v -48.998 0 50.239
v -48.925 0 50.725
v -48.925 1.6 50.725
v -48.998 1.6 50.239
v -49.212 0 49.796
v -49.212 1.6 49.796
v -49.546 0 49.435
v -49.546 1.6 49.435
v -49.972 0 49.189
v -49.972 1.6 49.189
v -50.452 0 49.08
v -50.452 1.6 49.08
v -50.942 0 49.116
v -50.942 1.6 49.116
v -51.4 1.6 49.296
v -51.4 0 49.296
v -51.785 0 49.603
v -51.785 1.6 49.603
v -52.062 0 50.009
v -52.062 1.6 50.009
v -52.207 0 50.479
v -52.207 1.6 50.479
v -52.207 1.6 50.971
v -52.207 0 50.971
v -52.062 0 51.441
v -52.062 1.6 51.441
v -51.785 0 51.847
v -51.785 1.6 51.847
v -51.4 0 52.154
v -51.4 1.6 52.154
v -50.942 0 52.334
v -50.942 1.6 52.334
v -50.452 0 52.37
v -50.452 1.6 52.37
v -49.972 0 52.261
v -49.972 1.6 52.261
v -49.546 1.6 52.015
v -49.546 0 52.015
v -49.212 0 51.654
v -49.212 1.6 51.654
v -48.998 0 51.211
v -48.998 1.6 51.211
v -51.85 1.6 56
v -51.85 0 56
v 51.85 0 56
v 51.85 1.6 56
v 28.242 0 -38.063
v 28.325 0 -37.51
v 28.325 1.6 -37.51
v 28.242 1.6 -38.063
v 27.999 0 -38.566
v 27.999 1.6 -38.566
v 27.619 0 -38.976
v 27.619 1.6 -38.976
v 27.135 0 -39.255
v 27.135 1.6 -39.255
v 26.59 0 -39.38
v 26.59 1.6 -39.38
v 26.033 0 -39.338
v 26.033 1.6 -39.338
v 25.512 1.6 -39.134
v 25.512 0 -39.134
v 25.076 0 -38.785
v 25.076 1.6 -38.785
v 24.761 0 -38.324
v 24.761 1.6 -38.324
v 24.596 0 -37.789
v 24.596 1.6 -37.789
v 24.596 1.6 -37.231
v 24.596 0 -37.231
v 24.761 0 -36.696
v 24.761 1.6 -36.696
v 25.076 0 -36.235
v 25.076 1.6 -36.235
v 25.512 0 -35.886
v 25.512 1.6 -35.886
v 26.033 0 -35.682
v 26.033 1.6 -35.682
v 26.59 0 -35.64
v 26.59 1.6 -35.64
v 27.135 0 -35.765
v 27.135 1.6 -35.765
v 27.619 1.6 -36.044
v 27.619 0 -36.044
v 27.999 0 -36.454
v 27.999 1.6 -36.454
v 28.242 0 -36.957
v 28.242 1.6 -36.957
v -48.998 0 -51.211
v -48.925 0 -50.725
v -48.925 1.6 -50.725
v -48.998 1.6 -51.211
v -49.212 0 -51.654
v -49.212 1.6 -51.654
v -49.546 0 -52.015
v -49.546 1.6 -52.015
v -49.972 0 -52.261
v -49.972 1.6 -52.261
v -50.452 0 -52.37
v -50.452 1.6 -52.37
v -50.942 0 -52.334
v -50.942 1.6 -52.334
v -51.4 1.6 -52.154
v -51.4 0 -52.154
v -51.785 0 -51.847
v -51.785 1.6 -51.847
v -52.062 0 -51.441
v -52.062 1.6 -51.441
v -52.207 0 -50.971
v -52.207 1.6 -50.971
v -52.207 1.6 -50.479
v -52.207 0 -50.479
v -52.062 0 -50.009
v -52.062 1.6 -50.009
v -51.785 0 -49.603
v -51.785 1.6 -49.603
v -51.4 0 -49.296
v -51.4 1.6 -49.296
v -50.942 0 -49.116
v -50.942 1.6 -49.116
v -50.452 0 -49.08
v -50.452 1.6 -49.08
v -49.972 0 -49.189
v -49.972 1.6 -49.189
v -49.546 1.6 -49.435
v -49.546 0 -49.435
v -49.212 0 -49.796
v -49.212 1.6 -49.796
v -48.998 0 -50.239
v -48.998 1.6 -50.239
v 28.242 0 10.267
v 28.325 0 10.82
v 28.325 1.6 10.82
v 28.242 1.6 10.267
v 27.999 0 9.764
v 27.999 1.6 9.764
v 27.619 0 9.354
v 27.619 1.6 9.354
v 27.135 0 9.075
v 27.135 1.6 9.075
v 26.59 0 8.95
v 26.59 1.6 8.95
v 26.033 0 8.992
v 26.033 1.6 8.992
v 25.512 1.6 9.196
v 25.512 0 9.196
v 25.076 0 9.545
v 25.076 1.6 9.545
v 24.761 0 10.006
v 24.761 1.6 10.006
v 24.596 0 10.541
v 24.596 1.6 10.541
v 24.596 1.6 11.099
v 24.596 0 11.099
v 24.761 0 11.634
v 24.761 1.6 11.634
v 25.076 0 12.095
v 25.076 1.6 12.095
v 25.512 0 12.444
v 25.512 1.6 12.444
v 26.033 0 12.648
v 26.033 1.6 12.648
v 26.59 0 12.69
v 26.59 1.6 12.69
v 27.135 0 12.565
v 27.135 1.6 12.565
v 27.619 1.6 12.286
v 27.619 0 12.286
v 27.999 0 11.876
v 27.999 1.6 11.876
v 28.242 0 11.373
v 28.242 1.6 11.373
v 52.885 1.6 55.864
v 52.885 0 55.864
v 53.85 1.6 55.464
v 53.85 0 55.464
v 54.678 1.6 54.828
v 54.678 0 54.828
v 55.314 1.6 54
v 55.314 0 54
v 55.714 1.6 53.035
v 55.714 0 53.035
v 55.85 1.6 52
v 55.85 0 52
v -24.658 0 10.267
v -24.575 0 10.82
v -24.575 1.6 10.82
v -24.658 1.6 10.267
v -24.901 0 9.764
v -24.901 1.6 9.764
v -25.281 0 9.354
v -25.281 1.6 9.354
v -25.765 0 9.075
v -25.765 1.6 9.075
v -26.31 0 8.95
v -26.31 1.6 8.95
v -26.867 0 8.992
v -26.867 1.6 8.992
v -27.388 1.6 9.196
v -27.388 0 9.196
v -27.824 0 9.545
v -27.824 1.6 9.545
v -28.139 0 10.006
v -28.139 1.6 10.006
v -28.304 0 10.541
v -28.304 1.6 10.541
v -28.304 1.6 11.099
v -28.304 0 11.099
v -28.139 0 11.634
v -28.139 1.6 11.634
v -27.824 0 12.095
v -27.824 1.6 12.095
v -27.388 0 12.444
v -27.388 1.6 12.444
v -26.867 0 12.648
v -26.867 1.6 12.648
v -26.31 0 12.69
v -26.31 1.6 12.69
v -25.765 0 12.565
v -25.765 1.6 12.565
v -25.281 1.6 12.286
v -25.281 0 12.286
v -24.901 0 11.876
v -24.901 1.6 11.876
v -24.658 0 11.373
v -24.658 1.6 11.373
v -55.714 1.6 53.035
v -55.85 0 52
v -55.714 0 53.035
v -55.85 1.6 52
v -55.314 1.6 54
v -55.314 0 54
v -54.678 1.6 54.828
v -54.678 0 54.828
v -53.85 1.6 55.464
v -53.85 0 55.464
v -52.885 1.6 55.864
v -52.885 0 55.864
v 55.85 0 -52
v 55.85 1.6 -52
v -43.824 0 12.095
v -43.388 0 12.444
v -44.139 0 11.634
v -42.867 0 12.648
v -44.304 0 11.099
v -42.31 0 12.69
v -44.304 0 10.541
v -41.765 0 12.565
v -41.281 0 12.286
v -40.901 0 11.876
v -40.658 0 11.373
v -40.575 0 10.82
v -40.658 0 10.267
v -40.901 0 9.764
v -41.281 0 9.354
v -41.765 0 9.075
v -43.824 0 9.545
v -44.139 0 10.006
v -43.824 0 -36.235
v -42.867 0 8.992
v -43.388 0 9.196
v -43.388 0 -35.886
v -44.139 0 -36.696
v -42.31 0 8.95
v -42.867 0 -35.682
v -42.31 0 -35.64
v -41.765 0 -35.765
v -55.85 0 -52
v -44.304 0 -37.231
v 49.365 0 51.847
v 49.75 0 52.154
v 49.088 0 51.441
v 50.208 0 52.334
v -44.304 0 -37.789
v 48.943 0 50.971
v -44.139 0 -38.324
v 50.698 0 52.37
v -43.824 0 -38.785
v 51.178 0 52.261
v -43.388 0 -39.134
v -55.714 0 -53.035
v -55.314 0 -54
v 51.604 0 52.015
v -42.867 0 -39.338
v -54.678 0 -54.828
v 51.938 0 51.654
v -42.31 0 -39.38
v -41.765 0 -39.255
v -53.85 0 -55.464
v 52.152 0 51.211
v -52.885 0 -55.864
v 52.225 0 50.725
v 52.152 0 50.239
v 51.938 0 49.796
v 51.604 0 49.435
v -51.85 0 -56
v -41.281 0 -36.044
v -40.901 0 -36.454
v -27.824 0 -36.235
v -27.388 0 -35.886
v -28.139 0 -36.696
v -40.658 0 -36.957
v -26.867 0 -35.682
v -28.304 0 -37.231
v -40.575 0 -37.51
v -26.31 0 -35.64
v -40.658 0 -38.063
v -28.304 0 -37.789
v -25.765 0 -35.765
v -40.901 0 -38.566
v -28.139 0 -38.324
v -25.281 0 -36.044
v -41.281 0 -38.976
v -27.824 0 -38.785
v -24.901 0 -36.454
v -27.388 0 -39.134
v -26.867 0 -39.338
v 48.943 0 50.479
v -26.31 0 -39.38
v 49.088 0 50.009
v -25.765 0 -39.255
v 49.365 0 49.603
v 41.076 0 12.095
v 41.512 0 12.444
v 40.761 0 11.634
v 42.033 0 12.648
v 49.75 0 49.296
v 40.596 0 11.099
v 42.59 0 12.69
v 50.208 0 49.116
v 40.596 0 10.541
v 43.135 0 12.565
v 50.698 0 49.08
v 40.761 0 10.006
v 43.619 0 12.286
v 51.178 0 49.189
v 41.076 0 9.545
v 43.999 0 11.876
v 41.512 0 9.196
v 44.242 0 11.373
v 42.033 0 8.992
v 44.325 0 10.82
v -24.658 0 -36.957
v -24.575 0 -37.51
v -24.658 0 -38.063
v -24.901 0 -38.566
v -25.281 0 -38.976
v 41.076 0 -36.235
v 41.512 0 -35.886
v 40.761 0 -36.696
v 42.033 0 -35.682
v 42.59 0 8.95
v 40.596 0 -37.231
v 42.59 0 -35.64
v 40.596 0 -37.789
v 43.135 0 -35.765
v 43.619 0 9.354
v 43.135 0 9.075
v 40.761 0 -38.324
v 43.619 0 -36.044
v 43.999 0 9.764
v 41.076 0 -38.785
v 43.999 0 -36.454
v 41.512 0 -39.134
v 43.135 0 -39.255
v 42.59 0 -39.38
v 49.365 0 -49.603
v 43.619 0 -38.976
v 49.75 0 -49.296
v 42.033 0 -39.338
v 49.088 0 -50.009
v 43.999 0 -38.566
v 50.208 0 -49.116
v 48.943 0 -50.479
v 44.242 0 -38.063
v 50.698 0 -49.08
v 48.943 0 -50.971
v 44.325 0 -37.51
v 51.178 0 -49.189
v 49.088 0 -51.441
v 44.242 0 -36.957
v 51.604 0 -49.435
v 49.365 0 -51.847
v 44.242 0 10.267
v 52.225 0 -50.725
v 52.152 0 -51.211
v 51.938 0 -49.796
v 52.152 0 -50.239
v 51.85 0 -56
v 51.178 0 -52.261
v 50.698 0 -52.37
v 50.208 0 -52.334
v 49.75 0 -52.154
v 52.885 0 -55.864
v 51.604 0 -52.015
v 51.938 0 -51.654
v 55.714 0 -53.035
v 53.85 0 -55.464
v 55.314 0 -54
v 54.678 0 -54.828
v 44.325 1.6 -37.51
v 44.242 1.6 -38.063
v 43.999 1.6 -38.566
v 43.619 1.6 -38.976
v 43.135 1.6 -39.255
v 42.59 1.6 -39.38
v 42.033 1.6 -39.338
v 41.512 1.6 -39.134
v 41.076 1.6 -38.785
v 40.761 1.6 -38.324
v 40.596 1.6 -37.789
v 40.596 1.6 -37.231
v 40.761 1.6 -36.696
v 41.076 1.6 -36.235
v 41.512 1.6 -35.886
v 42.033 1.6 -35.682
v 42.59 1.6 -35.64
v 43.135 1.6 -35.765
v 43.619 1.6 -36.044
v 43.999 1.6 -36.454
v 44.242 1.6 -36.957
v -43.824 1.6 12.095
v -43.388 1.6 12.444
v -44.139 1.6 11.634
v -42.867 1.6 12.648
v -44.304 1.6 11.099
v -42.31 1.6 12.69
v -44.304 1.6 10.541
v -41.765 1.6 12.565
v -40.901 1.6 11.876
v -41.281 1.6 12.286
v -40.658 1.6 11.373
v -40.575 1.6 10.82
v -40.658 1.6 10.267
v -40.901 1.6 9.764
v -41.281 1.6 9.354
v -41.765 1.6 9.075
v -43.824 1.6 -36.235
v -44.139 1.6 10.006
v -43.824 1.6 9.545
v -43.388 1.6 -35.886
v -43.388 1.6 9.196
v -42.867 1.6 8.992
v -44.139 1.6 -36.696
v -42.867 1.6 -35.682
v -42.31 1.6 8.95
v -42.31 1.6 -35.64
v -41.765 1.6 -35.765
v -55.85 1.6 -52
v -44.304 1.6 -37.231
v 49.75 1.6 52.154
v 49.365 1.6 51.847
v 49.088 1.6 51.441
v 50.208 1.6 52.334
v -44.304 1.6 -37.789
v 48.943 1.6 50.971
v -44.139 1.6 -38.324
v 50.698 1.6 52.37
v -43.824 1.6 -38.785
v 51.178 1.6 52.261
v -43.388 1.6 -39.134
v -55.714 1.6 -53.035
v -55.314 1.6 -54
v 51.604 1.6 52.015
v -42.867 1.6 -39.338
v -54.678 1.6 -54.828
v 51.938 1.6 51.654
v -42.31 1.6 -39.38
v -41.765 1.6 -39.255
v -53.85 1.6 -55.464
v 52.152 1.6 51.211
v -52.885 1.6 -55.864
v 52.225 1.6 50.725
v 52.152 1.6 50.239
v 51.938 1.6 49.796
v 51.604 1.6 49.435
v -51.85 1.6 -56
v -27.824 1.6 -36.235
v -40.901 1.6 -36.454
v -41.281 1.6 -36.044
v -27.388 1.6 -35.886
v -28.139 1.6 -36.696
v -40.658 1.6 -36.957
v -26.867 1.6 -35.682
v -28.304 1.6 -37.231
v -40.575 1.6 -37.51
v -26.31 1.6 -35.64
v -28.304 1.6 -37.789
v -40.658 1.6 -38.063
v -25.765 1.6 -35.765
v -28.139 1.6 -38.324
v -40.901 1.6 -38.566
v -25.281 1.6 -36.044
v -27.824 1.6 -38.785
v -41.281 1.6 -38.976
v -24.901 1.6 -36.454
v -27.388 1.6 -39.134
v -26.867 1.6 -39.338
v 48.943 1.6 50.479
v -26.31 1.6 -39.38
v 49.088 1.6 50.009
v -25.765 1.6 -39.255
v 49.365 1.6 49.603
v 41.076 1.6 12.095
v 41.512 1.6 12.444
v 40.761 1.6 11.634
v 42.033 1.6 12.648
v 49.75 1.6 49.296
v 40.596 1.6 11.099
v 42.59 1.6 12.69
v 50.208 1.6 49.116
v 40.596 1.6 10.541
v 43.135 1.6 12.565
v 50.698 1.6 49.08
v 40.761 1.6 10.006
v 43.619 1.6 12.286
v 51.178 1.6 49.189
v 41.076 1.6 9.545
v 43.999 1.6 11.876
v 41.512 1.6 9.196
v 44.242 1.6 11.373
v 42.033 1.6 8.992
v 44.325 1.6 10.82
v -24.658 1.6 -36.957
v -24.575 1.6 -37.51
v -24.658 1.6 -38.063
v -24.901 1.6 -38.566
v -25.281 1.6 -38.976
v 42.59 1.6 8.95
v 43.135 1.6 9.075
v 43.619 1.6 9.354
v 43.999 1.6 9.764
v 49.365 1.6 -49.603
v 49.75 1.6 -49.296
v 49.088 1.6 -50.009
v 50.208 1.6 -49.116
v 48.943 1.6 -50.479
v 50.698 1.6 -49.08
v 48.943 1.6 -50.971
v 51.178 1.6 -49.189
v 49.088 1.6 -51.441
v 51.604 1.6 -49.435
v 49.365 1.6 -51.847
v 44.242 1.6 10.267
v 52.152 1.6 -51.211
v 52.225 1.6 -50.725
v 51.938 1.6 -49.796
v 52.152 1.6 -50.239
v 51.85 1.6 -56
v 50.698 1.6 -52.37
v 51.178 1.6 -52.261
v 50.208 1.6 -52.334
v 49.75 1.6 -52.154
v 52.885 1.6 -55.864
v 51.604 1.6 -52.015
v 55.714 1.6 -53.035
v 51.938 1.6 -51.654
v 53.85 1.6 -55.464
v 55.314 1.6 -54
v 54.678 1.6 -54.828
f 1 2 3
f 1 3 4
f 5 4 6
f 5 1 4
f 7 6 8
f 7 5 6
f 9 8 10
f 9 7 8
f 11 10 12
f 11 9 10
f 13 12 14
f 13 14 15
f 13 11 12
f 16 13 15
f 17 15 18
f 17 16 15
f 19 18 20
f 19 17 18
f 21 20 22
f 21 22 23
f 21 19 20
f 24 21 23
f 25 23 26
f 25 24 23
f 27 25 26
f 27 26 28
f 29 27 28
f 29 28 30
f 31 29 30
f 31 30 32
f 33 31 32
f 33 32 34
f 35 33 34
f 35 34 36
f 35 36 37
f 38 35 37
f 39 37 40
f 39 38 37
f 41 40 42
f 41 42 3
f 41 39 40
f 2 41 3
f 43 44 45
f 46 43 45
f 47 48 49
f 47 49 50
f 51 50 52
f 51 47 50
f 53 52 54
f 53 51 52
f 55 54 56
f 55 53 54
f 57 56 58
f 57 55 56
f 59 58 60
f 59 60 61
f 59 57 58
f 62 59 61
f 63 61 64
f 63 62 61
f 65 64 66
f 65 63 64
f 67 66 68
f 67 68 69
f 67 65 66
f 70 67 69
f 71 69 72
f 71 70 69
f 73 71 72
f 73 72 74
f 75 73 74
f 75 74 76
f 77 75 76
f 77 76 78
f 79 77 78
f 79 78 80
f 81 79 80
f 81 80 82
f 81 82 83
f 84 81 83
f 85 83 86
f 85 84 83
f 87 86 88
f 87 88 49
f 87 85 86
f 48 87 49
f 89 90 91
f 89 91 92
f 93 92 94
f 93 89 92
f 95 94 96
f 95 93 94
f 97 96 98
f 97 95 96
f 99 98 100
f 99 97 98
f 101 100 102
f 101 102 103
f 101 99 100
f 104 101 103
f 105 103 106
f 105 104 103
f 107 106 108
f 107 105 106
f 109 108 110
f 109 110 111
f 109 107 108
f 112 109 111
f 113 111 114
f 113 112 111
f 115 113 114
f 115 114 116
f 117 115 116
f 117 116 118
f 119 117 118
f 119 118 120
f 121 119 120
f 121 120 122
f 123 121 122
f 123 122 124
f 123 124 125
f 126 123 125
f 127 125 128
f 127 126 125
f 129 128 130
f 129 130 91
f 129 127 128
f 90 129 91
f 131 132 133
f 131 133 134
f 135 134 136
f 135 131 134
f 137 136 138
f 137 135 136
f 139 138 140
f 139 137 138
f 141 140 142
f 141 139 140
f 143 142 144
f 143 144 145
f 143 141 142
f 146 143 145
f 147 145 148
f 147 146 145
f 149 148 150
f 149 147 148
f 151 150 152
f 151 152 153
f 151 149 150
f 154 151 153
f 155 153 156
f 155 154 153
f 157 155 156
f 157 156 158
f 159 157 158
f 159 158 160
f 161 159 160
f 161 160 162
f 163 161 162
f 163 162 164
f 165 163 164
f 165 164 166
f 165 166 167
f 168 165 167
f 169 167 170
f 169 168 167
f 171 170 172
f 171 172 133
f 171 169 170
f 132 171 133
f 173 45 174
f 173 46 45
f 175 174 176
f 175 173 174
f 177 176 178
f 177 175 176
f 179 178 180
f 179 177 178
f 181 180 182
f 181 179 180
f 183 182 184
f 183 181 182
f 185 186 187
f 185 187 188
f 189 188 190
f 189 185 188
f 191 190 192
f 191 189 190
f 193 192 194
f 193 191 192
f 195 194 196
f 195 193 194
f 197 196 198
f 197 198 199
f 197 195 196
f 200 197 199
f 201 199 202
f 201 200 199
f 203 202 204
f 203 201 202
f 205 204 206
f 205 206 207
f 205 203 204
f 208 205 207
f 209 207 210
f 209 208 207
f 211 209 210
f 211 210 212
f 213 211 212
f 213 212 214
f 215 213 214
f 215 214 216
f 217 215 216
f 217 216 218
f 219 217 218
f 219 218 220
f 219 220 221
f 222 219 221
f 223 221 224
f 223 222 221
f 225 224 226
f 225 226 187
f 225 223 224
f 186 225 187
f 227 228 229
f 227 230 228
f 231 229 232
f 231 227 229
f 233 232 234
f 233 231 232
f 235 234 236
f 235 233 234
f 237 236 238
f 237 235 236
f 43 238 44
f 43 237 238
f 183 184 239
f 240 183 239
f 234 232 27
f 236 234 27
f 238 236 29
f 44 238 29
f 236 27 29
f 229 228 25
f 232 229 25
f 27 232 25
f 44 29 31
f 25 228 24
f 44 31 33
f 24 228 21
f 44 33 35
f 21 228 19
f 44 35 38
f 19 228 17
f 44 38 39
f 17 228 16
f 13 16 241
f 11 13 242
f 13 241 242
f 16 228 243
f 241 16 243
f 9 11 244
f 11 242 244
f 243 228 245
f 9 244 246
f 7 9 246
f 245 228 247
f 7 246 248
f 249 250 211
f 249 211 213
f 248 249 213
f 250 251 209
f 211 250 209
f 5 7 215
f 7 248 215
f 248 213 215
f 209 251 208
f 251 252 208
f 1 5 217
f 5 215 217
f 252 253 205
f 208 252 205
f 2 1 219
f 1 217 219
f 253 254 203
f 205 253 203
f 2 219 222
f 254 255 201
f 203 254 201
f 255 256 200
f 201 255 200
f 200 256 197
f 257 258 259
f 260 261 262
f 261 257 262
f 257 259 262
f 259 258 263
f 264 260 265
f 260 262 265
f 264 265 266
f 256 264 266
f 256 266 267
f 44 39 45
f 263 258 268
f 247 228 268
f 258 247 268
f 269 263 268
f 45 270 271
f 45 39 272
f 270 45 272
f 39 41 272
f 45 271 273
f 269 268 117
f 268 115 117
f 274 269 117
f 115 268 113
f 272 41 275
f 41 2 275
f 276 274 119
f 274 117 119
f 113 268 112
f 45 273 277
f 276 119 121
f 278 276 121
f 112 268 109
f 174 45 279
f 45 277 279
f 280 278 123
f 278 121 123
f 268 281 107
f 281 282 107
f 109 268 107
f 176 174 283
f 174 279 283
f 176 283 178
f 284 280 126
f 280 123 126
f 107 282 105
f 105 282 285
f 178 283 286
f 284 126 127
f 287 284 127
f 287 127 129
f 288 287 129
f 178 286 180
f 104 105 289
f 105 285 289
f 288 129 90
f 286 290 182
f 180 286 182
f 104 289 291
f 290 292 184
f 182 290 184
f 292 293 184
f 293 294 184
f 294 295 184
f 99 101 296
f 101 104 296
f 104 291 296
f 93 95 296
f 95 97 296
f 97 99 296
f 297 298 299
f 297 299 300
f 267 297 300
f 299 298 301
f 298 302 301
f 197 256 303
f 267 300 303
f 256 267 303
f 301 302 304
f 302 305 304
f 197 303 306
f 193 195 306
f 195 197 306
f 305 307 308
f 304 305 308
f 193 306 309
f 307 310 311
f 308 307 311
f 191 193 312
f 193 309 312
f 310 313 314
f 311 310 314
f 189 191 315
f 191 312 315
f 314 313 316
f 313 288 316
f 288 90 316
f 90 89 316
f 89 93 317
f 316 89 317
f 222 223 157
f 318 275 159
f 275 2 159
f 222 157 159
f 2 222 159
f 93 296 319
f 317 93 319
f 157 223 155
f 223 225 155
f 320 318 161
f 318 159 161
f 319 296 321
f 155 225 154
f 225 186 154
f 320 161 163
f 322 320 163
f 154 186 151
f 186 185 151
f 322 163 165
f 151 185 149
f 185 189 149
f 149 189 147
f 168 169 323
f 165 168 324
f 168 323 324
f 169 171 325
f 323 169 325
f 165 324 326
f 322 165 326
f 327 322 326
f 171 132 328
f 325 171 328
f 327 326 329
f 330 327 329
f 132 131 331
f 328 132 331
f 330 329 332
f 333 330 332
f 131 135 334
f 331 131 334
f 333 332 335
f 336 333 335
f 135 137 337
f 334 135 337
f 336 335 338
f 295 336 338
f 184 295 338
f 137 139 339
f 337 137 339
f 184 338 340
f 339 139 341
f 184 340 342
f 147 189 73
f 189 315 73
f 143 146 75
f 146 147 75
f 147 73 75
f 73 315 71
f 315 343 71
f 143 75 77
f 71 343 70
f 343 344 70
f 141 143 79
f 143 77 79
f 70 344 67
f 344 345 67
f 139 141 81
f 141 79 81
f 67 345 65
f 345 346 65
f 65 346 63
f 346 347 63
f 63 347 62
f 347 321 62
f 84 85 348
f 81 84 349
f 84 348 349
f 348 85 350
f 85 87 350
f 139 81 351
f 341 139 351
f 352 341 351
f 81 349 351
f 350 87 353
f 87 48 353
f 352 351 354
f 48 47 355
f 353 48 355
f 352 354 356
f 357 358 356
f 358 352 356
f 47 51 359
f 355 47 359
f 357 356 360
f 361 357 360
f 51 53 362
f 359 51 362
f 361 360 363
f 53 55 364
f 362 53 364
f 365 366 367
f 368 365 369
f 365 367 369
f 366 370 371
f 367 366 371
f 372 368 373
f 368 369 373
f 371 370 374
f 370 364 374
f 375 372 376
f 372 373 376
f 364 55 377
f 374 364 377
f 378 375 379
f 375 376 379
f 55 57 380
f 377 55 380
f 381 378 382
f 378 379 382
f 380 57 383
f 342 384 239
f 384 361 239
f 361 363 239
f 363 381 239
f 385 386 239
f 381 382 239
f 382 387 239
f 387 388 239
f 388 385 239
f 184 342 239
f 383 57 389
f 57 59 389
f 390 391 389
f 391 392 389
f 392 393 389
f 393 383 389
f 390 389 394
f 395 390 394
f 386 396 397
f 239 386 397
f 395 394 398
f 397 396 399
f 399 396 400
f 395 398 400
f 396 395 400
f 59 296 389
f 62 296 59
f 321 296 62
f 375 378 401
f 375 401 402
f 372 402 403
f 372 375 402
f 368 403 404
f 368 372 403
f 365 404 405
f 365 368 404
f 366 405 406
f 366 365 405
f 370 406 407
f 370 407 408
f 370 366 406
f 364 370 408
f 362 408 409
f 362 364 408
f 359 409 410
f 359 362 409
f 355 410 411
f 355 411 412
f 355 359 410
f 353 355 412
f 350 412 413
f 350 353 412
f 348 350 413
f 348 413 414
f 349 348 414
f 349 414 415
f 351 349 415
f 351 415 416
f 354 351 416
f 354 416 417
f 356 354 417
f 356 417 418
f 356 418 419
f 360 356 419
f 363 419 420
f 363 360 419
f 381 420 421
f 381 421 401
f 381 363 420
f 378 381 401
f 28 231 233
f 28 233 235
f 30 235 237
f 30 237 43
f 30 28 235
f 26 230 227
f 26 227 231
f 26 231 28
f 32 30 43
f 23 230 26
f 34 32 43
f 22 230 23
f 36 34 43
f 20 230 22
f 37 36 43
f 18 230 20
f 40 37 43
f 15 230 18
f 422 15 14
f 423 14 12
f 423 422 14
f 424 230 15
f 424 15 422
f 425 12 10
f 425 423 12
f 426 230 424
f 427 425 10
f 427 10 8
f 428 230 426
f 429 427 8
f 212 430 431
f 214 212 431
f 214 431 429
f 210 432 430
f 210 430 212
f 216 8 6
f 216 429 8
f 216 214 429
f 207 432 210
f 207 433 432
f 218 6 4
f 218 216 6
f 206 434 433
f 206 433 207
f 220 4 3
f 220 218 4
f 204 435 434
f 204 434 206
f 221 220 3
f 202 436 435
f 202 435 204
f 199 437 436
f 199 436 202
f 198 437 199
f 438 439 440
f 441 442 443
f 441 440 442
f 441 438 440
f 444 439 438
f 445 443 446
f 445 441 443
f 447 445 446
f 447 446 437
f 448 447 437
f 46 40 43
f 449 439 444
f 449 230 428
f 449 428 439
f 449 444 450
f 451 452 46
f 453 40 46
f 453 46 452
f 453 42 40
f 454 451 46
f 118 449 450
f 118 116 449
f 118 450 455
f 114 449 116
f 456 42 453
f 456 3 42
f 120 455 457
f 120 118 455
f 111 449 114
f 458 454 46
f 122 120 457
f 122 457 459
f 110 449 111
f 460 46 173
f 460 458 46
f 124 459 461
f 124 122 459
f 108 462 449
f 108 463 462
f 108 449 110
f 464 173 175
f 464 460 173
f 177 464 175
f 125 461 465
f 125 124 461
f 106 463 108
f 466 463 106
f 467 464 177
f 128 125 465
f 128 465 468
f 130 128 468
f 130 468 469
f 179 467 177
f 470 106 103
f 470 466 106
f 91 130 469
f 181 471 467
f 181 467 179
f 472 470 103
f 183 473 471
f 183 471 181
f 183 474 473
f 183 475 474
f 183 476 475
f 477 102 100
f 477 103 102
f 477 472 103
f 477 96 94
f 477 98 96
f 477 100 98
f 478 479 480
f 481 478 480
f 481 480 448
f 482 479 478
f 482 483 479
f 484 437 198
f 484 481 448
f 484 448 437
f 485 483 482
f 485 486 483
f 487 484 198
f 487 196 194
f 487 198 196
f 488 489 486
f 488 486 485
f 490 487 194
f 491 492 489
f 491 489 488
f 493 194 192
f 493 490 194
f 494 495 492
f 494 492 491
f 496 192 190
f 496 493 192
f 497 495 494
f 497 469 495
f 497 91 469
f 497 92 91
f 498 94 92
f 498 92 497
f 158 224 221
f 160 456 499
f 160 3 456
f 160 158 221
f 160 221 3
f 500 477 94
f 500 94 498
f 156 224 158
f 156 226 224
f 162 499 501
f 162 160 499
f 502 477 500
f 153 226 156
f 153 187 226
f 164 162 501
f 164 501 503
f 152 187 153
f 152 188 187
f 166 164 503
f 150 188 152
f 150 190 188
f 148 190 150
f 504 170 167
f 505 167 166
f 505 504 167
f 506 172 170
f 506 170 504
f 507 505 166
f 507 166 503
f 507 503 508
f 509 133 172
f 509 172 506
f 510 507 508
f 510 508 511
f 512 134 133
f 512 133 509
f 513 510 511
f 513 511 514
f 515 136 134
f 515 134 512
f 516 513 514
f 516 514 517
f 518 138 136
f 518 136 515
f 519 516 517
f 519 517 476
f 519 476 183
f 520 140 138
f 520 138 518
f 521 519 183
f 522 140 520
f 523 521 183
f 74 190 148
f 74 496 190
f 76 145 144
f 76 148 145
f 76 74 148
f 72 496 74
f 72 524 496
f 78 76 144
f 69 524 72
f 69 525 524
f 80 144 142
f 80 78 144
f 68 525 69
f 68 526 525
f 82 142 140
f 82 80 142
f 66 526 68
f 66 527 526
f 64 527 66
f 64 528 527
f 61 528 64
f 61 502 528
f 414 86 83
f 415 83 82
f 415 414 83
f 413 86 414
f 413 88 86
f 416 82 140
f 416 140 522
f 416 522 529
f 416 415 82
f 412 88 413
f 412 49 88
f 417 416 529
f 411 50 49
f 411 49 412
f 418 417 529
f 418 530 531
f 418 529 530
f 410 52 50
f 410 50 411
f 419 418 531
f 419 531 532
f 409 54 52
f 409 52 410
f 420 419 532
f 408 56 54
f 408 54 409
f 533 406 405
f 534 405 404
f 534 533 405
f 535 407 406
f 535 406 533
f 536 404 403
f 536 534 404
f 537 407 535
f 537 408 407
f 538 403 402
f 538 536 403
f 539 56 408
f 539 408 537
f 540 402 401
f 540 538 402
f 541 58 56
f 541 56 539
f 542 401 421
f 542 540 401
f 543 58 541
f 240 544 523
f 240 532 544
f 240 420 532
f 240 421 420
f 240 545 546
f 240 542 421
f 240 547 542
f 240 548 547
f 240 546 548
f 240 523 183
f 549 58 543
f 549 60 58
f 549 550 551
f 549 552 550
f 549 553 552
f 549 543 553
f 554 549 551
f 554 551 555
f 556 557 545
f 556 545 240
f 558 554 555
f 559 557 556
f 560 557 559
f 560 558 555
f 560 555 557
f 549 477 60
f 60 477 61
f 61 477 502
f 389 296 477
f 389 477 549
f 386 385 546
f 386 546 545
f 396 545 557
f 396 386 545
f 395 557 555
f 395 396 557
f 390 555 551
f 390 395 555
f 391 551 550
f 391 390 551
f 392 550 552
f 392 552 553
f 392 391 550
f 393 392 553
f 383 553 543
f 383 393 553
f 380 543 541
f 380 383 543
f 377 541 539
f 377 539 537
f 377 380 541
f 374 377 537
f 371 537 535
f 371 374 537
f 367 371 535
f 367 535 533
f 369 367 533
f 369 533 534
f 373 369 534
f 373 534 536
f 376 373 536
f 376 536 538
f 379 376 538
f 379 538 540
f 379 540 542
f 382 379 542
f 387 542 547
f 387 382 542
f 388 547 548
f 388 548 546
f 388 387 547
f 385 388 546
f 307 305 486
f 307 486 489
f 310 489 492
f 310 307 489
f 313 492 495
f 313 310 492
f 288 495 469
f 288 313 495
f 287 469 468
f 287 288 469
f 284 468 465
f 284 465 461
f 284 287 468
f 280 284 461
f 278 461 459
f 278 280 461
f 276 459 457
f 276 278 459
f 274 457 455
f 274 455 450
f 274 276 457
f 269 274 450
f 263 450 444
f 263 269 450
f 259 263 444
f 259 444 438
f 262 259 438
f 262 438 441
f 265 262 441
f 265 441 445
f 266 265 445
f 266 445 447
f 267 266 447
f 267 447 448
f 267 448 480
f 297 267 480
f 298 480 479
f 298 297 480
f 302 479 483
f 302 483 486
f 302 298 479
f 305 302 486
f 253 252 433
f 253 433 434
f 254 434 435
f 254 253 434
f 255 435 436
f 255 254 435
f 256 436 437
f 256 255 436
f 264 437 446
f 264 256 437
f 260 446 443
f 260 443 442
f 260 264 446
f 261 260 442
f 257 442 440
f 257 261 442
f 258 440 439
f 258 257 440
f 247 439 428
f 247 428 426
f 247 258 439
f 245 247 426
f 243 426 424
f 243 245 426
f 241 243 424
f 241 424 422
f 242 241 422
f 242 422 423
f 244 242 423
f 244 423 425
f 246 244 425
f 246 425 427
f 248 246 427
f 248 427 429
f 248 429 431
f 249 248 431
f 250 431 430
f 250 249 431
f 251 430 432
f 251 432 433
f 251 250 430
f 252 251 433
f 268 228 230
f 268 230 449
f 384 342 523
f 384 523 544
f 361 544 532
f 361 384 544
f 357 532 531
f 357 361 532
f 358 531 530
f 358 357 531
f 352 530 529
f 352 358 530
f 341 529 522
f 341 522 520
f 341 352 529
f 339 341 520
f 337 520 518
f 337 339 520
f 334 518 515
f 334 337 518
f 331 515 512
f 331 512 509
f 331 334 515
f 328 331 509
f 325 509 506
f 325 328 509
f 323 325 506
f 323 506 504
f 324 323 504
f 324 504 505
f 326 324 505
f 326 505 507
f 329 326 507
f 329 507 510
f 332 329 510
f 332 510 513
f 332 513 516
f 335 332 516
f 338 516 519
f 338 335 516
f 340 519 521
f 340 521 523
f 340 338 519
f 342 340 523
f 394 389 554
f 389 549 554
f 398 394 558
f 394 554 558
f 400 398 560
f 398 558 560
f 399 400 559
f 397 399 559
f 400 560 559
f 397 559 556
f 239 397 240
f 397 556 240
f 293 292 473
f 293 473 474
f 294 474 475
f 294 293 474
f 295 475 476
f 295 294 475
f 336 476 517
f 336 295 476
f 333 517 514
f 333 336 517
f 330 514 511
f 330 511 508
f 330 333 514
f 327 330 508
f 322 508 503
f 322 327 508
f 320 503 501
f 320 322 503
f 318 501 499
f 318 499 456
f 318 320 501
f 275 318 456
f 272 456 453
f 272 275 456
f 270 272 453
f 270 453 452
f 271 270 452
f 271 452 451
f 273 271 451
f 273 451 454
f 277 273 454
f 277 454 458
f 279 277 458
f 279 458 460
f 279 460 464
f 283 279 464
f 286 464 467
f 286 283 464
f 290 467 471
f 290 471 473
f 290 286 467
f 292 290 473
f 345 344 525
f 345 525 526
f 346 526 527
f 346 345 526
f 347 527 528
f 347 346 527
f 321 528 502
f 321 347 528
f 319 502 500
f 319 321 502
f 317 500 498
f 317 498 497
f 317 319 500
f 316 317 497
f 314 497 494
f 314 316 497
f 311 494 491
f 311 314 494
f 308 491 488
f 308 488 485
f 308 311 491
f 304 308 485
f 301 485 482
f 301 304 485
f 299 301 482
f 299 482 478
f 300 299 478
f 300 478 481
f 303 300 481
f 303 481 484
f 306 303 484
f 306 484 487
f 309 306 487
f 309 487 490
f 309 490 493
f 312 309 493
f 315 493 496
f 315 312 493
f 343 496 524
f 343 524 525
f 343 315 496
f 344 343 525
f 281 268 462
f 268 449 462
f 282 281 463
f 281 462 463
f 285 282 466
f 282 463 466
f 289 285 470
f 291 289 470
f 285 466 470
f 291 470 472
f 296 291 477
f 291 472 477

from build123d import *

# Parameters (mm, degrees)
SKETCH1_W           = 111.7
SKETCH1_H           = 112
SKETCH1_R           = 1.65
SKETCH1_R_2         = 1.875
BOSS_EXTRUDE1_DEPTH = 1.6
FILLET1_R           = 4


with BuildPart() as part:
    # Sketch1 → Boss-Extrude1 (new body)
    with BuildSketch(Plane(origin=(0, 0, 0), x_dir=(1, 0, 0), z_dir=(0, 1, 0))):
        Rectangle(SKETCH1_W, SKETCH1_H)
        with Locations((-50.575, 50.725)):
            Circle(SKETCH1_R, mode=Mode.SUBTRACT)
        with Locations((-50.575, -50.725)):
            Circle(SKETCH1_R, mode=Mode.SUBTRACT)
        with Locations((50.575, 50.725)):
            Circle(SKETCH1_R, mode=Mode.SUBTRACT)
        with Locations((50.575, -50.725)):
            Circle(SKETCH1_R, mode=Mode.SUBTRACT)
        with Locations((26.45, -10.82)):
            Circle(SKETCH1_R_2, mode=Mode.SUBTRACT)
        with Locations((42.45, -10.82)):
            Circle(SKETCH1_R_2, mode=Mode.SUBTRACT)
        with Locations((42.45, 37.51)):
            Circle(SKETCH1_R_2, mode=Mode.SUBTRACT)
        with Locations((26.45, 37.51)):
            Circle(SKETCH1_R_2, mode=Mode.SUBTRACT)
        with Locations((-42.45, -10.82)):
            Circle(SKETCH1_R_2, mode=Mode.SUBTRACT)
        with Locations((-26.45, -10.82)):
            Circle(SKETCH1_R_2, mode=Mode.SUBTRACT)
        with Locations((-42.45, 37.51)):
            Circle(SKETCH1_R_2, mode=Mode.SUBTRACT)
        with Locations((-26.45, 37.51)):
            Circle(SKETCH1_R_2, mode=Mode.SUBTRACT)
    extrude(amount=BOSS_EXTRUDE1_DEPTH)

    # Fillet1
    fillet1_edges = [part.edges().sort_by_distance(p)[0] for p in [
        (55.85, 0.8, 56),
        (-55.85, 0.8, 56),
        (-55.85, 0.8, -56),
        (55.85, 0.8, -56),
    ]]
    fillet(fillet1_edges, radius=FILLET1_R)


solid = part.part
